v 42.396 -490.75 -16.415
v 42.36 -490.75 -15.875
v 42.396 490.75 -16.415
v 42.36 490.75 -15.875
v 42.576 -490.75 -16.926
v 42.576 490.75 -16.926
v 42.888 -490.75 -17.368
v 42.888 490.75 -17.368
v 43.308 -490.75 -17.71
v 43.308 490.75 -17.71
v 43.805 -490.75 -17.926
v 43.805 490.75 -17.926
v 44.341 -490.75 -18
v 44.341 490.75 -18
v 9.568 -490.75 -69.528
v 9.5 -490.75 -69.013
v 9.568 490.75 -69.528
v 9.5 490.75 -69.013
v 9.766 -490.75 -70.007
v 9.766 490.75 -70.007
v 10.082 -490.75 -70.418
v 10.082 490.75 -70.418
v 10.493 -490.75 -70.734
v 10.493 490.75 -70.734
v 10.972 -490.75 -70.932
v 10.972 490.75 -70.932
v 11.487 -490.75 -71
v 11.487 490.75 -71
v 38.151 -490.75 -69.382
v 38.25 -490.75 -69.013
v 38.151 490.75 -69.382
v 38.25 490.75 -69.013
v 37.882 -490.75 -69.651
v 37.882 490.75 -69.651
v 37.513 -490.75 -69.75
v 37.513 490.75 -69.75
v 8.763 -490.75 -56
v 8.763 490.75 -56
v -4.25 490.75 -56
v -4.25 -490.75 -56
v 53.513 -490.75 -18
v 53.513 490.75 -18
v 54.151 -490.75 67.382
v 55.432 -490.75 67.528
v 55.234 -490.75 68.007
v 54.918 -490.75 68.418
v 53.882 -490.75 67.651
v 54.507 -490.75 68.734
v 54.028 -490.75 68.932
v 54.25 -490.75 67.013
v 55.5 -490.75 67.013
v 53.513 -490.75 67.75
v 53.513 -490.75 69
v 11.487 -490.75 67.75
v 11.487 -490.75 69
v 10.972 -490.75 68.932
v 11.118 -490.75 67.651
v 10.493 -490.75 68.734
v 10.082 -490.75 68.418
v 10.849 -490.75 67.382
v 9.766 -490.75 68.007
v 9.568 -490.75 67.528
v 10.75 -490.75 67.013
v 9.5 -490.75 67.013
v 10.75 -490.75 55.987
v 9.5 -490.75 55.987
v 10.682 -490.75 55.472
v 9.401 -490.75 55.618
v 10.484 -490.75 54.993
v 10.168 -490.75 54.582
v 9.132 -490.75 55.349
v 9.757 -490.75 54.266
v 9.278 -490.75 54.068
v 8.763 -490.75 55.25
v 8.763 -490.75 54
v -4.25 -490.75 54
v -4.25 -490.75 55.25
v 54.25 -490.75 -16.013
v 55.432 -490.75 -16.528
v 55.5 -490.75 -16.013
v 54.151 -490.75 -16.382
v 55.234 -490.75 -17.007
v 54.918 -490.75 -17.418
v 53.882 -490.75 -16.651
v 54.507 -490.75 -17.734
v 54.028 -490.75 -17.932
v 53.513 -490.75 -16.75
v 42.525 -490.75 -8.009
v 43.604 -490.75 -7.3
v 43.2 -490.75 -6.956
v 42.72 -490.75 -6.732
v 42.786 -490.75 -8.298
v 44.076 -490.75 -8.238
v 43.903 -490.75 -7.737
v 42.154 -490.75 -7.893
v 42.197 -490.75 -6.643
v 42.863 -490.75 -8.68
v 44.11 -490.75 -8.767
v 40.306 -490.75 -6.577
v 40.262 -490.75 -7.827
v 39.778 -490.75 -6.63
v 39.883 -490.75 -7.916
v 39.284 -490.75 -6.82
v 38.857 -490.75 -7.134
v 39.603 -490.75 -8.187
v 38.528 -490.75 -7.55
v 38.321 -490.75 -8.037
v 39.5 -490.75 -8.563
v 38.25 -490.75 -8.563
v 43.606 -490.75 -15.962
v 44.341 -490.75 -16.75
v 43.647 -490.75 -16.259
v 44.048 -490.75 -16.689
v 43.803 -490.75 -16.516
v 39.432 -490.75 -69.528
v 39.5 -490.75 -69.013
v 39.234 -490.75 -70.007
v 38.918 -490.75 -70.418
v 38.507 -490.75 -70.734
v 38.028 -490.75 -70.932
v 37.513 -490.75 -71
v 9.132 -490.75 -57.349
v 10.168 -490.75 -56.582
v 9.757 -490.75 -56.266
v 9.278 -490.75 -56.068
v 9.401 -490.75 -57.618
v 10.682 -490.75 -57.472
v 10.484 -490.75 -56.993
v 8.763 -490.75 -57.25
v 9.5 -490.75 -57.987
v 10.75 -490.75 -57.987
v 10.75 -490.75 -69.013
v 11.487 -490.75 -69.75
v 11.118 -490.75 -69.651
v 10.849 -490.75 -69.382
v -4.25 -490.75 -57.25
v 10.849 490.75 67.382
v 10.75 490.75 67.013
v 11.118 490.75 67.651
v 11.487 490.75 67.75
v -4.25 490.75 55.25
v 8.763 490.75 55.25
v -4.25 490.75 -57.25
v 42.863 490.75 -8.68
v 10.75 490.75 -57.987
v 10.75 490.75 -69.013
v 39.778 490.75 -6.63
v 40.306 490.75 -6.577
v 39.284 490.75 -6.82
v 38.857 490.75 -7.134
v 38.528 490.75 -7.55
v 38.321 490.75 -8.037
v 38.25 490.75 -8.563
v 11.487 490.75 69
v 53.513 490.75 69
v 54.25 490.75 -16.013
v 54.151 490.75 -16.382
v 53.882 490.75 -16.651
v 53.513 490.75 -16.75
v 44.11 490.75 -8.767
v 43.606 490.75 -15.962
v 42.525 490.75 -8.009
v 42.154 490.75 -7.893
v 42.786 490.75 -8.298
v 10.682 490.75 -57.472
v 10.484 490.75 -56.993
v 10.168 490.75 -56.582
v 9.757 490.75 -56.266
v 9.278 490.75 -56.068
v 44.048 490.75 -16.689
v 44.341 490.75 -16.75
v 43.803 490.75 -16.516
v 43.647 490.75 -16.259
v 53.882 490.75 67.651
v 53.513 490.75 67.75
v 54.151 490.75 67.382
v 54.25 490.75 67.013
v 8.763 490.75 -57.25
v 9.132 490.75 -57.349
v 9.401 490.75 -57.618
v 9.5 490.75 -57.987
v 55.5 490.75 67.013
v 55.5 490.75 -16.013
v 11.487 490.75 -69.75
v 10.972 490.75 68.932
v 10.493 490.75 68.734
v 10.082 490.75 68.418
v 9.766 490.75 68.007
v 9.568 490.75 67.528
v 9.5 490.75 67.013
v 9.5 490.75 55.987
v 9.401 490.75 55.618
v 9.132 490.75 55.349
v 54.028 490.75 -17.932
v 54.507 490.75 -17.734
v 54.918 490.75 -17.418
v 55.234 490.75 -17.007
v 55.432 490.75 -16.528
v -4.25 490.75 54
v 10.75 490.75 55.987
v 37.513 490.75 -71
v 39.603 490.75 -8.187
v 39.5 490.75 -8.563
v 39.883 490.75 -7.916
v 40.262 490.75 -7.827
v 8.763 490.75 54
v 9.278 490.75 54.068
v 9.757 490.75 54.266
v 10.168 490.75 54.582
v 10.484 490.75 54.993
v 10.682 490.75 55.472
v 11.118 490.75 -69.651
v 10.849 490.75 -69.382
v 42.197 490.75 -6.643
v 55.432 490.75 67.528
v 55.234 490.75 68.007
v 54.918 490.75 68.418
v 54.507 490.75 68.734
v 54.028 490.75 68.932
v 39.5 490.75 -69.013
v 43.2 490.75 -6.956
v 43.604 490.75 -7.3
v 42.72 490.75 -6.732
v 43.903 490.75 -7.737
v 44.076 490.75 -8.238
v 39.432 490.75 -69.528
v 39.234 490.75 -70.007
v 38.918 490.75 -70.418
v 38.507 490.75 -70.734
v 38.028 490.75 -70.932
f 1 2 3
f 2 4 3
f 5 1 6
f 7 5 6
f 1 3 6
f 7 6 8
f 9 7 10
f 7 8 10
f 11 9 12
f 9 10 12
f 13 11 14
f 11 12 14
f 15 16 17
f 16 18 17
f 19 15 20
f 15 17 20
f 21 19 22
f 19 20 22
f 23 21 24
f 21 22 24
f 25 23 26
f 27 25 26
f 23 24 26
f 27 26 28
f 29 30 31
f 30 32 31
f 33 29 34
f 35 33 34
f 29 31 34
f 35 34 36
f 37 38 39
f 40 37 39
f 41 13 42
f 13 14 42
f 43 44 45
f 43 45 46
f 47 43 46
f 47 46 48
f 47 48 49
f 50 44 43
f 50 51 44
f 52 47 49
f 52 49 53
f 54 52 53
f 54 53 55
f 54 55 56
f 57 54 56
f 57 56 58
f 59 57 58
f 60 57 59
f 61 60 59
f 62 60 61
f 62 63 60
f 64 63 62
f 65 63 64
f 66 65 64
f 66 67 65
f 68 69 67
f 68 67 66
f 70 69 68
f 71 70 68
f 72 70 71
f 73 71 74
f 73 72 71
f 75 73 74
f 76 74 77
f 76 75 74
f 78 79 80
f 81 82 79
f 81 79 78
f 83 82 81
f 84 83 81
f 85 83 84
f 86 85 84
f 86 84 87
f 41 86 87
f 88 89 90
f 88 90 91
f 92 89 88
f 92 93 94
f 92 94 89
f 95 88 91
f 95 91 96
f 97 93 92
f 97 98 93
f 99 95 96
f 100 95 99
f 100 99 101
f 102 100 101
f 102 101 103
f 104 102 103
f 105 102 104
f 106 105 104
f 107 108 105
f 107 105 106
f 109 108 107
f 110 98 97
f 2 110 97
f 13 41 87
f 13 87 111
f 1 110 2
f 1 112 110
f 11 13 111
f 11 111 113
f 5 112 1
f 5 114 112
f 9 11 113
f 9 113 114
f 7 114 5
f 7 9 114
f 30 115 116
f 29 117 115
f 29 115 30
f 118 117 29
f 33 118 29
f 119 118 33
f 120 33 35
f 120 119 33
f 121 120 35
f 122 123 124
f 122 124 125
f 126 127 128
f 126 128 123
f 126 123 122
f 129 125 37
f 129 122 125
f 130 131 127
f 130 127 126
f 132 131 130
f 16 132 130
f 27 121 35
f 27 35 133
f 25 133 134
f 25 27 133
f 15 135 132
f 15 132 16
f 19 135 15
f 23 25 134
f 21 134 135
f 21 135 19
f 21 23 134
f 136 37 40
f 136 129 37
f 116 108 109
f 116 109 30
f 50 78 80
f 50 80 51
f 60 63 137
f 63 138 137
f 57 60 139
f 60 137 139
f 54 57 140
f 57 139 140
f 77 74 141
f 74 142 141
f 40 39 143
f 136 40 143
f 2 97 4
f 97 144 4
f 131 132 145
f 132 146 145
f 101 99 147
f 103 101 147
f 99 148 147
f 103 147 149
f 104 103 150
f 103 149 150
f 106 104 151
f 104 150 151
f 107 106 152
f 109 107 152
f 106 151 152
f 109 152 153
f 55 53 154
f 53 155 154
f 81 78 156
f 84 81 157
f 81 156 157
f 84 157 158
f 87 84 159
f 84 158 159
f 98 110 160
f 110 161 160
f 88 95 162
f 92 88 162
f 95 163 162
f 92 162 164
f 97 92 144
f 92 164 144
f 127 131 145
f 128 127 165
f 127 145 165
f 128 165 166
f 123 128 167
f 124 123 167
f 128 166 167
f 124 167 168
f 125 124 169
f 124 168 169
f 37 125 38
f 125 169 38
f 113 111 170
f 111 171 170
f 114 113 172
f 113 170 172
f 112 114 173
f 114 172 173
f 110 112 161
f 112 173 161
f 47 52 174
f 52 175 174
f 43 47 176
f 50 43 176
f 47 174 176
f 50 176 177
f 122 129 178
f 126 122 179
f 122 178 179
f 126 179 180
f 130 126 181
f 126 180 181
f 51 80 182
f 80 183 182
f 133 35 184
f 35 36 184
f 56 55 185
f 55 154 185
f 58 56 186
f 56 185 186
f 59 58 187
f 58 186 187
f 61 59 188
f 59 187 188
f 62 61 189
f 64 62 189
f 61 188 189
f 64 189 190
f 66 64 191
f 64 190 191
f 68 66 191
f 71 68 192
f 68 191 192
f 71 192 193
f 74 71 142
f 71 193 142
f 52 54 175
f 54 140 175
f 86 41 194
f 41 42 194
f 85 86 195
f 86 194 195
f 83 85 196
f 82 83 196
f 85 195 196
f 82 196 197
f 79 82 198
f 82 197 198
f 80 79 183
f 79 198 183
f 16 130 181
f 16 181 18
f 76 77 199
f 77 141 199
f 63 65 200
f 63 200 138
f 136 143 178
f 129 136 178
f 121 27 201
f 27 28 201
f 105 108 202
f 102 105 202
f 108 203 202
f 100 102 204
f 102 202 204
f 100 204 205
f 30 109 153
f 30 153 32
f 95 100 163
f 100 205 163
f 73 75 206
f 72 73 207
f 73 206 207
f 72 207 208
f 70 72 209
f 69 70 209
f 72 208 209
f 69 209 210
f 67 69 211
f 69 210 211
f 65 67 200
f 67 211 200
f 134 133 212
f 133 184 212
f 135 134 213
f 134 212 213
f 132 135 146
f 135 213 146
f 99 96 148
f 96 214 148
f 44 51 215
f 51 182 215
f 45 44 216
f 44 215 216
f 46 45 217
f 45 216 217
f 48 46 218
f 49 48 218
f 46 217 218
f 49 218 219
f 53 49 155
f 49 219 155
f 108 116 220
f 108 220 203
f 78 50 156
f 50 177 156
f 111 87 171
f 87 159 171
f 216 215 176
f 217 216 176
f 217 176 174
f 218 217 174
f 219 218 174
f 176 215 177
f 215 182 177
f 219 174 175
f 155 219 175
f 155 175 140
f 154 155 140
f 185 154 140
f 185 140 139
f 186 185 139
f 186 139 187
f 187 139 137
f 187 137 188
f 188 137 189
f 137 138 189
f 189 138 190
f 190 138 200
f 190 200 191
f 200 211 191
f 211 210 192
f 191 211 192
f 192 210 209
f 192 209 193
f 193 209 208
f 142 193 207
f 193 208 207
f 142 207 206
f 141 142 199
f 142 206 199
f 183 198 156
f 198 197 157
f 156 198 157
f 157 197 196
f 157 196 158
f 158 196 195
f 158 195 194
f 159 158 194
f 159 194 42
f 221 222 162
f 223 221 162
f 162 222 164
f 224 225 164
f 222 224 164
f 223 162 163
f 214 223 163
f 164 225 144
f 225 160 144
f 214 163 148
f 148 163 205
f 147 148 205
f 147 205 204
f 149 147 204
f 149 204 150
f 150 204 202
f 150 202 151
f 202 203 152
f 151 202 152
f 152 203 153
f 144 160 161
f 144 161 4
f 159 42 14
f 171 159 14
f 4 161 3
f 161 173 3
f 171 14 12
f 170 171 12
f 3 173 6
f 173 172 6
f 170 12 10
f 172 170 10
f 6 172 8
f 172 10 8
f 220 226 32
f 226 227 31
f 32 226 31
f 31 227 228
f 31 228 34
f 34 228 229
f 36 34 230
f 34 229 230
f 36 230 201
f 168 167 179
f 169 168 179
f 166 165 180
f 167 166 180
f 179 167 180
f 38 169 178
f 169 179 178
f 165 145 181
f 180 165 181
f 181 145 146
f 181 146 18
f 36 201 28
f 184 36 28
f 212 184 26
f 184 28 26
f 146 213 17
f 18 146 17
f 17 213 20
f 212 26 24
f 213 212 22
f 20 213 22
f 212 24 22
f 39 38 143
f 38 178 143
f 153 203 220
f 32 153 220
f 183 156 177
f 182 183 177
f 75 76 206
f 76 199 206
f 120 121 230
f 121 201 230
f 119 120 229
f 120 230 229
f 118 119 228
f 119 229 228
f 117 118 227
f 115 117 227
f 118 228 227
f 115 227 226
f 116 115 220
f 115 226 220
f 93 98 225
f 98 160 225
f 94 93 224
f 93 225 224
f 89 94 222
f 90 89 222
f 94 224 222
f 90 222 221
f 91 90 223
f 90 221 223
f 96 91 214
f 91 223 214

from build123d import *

# Parameters (mm, degrees)
BASE_FLANGE1_DEPTH = 490.75


# Sheet-metal steps are written as plain solids
with BuildPart() as part:
    # Sketch1 → Base-Flange1 (new, symmetric)
    with BuildSketch(Plane(origin=(0, 0, 0), x_dir=(1, 0, 0), z_dir=(0, 1, 0))):
        with BuildLine():
            Line((-4.25, 57.25), (8.7634, 57.25))
            ThreePointArc((8.7634, 57.25), (9.284254855, 57.465745145), (9.5, 57.9866))
            Line((9.5, 57.9866), (9.5, 69.0134))
            ThreePointArc((9.5, 69.0134), (10.081861668, 70.418138332), (11.4866, 71))
            Line((11.4866, 71), (37.5134, 71))
            ThreePointArc((37.5134, 71), (38.918138332, 70.418138332), (39.5, 69.0134))
            Line((39.5, 69.0134), (39.5, 17))
            Line((39.5, 17), (39.5, 8.562771629))
            ThreePointArc((39.5, 8.562771629), (39.724914644, 8.032905932), (40.262306969, 7.826620346))
            Line((40.262306969, 7.826620346), (42.153527557, 7.892663224))
            ThreePointArc((42.153527557, 7.892663224), (42.675221066, 8.135932903), (42.862626267, 8.680197126))
            Line((42.862626267, 8.680197126), (42.359529101, 15.874821789))
            ThreePointArc((42.359529101, 15.874821789), (42.88838258, 17.368257942), (44.341289843, 18))
            Line((44.341289843, 18), (53.5134, 18))
            ThreePointArc((53.5134, 18), (54.918138332, 17.418138332), (55.5, 16.0134))
            Line((55.5, 16.0134), (55.5, -22))
            Line((55.5, -22), (55.5, -67.0134))
            ThreePointArc((55.5, -67.0134), (54.918138332, -68.418138332), (53.5134, -69))
            Line((53.5134, -69), (39.5, -69))
            Line((39.5, -69), (11.4866, -69))
            ThreePointArc((11.4866, -69), (10.081861668, -68.418138332), (9.5, -67.0134))
            Line((9.5, -67.0134), (9.5, -55.9866))
            ThreePointArc((9.5, -55.9866), (9.284254855, -55.465745145), (8.7634, -55.25))
            Line((8.7634, -55.25), (-4.25, -55.25))
            Line((-4.25, -55.25), (-4.25, -54))
            Line((-4.25, -54), (8.7634, -54))
            ThreePointArc((8.7634, -54), (10.168138332, -54.581861668), (10.75, -55.9866))
            Line((10.75, -55.9866), (10.75, -67.0134))
            ThreePointArc((10.75, -67.0134), (10.965745145, -67.534254855), (11.4866, -67.75))
            Line((11.4866, -67.75), (39.5, -67.75))
            Line((39.5, -67.75), (53.5134, -67.75))
            ThreePointArc((53.5134, -67.75), (54.034254855, -67.534254855), (54.25, -67.0134))
            Line((54.25, -67.0134), (54.25, -22))
            Line((54.25, -22), (54.25, 16.0134))
            ThreePointArc((54.25, 16.0134), (54.034254855, 16.534254855), (53.5134, 16.75))
            Line((53.5134, 16.75), (44.341289843, 16.75))
            ThreePointArc((44.341289843, 16.75), (43.802574707, 16.515759992), (43.606484164, 15.962017381))
            Line((43.606484164, 15.962017381), (44.10958133, 8.767392718))
            ThreePointArc((44.10958133, 8.767392718), (43.604152098, 7.299519645), (42.197151928, 6.64342469))
            Line((42.197151928, 6.64342469), (40.30593134, 6.577381812))
            ThreePointArc((40.30593134, 6.577381812), (38.856591681, 7.133731182), (38.25, 8.562771629))
            Line((38.25, 8.562771629), (38.25, 17))
            Line((38.25, 17), (38.25, 69.0134))
            ThreePointArc((38.25, 69.0134), (38.034254855, 69.534254855), (37.5134, 69.75))
            Line((37.5134, 69.75), (11.4866, 69.75))
            ThreePointArc((11.4866, 69.75), (10.965745145, 69.534254855), (10.75, 69.0134))
            Line((10.75, 69.0134), (10.75, 57.9866))
            ThreePointArc((10.75, 57.9866), (10.168138332, 56.581861668), (8.7634, 56))
            Line((8.7634, 56), (-4.25, 56))
            Line((-4.25, 56), (-4.25, 57.25))
        make_face()
    extrude(amount=BASE_FLANGE1_DEPTH, both=True)


solid = part.part
